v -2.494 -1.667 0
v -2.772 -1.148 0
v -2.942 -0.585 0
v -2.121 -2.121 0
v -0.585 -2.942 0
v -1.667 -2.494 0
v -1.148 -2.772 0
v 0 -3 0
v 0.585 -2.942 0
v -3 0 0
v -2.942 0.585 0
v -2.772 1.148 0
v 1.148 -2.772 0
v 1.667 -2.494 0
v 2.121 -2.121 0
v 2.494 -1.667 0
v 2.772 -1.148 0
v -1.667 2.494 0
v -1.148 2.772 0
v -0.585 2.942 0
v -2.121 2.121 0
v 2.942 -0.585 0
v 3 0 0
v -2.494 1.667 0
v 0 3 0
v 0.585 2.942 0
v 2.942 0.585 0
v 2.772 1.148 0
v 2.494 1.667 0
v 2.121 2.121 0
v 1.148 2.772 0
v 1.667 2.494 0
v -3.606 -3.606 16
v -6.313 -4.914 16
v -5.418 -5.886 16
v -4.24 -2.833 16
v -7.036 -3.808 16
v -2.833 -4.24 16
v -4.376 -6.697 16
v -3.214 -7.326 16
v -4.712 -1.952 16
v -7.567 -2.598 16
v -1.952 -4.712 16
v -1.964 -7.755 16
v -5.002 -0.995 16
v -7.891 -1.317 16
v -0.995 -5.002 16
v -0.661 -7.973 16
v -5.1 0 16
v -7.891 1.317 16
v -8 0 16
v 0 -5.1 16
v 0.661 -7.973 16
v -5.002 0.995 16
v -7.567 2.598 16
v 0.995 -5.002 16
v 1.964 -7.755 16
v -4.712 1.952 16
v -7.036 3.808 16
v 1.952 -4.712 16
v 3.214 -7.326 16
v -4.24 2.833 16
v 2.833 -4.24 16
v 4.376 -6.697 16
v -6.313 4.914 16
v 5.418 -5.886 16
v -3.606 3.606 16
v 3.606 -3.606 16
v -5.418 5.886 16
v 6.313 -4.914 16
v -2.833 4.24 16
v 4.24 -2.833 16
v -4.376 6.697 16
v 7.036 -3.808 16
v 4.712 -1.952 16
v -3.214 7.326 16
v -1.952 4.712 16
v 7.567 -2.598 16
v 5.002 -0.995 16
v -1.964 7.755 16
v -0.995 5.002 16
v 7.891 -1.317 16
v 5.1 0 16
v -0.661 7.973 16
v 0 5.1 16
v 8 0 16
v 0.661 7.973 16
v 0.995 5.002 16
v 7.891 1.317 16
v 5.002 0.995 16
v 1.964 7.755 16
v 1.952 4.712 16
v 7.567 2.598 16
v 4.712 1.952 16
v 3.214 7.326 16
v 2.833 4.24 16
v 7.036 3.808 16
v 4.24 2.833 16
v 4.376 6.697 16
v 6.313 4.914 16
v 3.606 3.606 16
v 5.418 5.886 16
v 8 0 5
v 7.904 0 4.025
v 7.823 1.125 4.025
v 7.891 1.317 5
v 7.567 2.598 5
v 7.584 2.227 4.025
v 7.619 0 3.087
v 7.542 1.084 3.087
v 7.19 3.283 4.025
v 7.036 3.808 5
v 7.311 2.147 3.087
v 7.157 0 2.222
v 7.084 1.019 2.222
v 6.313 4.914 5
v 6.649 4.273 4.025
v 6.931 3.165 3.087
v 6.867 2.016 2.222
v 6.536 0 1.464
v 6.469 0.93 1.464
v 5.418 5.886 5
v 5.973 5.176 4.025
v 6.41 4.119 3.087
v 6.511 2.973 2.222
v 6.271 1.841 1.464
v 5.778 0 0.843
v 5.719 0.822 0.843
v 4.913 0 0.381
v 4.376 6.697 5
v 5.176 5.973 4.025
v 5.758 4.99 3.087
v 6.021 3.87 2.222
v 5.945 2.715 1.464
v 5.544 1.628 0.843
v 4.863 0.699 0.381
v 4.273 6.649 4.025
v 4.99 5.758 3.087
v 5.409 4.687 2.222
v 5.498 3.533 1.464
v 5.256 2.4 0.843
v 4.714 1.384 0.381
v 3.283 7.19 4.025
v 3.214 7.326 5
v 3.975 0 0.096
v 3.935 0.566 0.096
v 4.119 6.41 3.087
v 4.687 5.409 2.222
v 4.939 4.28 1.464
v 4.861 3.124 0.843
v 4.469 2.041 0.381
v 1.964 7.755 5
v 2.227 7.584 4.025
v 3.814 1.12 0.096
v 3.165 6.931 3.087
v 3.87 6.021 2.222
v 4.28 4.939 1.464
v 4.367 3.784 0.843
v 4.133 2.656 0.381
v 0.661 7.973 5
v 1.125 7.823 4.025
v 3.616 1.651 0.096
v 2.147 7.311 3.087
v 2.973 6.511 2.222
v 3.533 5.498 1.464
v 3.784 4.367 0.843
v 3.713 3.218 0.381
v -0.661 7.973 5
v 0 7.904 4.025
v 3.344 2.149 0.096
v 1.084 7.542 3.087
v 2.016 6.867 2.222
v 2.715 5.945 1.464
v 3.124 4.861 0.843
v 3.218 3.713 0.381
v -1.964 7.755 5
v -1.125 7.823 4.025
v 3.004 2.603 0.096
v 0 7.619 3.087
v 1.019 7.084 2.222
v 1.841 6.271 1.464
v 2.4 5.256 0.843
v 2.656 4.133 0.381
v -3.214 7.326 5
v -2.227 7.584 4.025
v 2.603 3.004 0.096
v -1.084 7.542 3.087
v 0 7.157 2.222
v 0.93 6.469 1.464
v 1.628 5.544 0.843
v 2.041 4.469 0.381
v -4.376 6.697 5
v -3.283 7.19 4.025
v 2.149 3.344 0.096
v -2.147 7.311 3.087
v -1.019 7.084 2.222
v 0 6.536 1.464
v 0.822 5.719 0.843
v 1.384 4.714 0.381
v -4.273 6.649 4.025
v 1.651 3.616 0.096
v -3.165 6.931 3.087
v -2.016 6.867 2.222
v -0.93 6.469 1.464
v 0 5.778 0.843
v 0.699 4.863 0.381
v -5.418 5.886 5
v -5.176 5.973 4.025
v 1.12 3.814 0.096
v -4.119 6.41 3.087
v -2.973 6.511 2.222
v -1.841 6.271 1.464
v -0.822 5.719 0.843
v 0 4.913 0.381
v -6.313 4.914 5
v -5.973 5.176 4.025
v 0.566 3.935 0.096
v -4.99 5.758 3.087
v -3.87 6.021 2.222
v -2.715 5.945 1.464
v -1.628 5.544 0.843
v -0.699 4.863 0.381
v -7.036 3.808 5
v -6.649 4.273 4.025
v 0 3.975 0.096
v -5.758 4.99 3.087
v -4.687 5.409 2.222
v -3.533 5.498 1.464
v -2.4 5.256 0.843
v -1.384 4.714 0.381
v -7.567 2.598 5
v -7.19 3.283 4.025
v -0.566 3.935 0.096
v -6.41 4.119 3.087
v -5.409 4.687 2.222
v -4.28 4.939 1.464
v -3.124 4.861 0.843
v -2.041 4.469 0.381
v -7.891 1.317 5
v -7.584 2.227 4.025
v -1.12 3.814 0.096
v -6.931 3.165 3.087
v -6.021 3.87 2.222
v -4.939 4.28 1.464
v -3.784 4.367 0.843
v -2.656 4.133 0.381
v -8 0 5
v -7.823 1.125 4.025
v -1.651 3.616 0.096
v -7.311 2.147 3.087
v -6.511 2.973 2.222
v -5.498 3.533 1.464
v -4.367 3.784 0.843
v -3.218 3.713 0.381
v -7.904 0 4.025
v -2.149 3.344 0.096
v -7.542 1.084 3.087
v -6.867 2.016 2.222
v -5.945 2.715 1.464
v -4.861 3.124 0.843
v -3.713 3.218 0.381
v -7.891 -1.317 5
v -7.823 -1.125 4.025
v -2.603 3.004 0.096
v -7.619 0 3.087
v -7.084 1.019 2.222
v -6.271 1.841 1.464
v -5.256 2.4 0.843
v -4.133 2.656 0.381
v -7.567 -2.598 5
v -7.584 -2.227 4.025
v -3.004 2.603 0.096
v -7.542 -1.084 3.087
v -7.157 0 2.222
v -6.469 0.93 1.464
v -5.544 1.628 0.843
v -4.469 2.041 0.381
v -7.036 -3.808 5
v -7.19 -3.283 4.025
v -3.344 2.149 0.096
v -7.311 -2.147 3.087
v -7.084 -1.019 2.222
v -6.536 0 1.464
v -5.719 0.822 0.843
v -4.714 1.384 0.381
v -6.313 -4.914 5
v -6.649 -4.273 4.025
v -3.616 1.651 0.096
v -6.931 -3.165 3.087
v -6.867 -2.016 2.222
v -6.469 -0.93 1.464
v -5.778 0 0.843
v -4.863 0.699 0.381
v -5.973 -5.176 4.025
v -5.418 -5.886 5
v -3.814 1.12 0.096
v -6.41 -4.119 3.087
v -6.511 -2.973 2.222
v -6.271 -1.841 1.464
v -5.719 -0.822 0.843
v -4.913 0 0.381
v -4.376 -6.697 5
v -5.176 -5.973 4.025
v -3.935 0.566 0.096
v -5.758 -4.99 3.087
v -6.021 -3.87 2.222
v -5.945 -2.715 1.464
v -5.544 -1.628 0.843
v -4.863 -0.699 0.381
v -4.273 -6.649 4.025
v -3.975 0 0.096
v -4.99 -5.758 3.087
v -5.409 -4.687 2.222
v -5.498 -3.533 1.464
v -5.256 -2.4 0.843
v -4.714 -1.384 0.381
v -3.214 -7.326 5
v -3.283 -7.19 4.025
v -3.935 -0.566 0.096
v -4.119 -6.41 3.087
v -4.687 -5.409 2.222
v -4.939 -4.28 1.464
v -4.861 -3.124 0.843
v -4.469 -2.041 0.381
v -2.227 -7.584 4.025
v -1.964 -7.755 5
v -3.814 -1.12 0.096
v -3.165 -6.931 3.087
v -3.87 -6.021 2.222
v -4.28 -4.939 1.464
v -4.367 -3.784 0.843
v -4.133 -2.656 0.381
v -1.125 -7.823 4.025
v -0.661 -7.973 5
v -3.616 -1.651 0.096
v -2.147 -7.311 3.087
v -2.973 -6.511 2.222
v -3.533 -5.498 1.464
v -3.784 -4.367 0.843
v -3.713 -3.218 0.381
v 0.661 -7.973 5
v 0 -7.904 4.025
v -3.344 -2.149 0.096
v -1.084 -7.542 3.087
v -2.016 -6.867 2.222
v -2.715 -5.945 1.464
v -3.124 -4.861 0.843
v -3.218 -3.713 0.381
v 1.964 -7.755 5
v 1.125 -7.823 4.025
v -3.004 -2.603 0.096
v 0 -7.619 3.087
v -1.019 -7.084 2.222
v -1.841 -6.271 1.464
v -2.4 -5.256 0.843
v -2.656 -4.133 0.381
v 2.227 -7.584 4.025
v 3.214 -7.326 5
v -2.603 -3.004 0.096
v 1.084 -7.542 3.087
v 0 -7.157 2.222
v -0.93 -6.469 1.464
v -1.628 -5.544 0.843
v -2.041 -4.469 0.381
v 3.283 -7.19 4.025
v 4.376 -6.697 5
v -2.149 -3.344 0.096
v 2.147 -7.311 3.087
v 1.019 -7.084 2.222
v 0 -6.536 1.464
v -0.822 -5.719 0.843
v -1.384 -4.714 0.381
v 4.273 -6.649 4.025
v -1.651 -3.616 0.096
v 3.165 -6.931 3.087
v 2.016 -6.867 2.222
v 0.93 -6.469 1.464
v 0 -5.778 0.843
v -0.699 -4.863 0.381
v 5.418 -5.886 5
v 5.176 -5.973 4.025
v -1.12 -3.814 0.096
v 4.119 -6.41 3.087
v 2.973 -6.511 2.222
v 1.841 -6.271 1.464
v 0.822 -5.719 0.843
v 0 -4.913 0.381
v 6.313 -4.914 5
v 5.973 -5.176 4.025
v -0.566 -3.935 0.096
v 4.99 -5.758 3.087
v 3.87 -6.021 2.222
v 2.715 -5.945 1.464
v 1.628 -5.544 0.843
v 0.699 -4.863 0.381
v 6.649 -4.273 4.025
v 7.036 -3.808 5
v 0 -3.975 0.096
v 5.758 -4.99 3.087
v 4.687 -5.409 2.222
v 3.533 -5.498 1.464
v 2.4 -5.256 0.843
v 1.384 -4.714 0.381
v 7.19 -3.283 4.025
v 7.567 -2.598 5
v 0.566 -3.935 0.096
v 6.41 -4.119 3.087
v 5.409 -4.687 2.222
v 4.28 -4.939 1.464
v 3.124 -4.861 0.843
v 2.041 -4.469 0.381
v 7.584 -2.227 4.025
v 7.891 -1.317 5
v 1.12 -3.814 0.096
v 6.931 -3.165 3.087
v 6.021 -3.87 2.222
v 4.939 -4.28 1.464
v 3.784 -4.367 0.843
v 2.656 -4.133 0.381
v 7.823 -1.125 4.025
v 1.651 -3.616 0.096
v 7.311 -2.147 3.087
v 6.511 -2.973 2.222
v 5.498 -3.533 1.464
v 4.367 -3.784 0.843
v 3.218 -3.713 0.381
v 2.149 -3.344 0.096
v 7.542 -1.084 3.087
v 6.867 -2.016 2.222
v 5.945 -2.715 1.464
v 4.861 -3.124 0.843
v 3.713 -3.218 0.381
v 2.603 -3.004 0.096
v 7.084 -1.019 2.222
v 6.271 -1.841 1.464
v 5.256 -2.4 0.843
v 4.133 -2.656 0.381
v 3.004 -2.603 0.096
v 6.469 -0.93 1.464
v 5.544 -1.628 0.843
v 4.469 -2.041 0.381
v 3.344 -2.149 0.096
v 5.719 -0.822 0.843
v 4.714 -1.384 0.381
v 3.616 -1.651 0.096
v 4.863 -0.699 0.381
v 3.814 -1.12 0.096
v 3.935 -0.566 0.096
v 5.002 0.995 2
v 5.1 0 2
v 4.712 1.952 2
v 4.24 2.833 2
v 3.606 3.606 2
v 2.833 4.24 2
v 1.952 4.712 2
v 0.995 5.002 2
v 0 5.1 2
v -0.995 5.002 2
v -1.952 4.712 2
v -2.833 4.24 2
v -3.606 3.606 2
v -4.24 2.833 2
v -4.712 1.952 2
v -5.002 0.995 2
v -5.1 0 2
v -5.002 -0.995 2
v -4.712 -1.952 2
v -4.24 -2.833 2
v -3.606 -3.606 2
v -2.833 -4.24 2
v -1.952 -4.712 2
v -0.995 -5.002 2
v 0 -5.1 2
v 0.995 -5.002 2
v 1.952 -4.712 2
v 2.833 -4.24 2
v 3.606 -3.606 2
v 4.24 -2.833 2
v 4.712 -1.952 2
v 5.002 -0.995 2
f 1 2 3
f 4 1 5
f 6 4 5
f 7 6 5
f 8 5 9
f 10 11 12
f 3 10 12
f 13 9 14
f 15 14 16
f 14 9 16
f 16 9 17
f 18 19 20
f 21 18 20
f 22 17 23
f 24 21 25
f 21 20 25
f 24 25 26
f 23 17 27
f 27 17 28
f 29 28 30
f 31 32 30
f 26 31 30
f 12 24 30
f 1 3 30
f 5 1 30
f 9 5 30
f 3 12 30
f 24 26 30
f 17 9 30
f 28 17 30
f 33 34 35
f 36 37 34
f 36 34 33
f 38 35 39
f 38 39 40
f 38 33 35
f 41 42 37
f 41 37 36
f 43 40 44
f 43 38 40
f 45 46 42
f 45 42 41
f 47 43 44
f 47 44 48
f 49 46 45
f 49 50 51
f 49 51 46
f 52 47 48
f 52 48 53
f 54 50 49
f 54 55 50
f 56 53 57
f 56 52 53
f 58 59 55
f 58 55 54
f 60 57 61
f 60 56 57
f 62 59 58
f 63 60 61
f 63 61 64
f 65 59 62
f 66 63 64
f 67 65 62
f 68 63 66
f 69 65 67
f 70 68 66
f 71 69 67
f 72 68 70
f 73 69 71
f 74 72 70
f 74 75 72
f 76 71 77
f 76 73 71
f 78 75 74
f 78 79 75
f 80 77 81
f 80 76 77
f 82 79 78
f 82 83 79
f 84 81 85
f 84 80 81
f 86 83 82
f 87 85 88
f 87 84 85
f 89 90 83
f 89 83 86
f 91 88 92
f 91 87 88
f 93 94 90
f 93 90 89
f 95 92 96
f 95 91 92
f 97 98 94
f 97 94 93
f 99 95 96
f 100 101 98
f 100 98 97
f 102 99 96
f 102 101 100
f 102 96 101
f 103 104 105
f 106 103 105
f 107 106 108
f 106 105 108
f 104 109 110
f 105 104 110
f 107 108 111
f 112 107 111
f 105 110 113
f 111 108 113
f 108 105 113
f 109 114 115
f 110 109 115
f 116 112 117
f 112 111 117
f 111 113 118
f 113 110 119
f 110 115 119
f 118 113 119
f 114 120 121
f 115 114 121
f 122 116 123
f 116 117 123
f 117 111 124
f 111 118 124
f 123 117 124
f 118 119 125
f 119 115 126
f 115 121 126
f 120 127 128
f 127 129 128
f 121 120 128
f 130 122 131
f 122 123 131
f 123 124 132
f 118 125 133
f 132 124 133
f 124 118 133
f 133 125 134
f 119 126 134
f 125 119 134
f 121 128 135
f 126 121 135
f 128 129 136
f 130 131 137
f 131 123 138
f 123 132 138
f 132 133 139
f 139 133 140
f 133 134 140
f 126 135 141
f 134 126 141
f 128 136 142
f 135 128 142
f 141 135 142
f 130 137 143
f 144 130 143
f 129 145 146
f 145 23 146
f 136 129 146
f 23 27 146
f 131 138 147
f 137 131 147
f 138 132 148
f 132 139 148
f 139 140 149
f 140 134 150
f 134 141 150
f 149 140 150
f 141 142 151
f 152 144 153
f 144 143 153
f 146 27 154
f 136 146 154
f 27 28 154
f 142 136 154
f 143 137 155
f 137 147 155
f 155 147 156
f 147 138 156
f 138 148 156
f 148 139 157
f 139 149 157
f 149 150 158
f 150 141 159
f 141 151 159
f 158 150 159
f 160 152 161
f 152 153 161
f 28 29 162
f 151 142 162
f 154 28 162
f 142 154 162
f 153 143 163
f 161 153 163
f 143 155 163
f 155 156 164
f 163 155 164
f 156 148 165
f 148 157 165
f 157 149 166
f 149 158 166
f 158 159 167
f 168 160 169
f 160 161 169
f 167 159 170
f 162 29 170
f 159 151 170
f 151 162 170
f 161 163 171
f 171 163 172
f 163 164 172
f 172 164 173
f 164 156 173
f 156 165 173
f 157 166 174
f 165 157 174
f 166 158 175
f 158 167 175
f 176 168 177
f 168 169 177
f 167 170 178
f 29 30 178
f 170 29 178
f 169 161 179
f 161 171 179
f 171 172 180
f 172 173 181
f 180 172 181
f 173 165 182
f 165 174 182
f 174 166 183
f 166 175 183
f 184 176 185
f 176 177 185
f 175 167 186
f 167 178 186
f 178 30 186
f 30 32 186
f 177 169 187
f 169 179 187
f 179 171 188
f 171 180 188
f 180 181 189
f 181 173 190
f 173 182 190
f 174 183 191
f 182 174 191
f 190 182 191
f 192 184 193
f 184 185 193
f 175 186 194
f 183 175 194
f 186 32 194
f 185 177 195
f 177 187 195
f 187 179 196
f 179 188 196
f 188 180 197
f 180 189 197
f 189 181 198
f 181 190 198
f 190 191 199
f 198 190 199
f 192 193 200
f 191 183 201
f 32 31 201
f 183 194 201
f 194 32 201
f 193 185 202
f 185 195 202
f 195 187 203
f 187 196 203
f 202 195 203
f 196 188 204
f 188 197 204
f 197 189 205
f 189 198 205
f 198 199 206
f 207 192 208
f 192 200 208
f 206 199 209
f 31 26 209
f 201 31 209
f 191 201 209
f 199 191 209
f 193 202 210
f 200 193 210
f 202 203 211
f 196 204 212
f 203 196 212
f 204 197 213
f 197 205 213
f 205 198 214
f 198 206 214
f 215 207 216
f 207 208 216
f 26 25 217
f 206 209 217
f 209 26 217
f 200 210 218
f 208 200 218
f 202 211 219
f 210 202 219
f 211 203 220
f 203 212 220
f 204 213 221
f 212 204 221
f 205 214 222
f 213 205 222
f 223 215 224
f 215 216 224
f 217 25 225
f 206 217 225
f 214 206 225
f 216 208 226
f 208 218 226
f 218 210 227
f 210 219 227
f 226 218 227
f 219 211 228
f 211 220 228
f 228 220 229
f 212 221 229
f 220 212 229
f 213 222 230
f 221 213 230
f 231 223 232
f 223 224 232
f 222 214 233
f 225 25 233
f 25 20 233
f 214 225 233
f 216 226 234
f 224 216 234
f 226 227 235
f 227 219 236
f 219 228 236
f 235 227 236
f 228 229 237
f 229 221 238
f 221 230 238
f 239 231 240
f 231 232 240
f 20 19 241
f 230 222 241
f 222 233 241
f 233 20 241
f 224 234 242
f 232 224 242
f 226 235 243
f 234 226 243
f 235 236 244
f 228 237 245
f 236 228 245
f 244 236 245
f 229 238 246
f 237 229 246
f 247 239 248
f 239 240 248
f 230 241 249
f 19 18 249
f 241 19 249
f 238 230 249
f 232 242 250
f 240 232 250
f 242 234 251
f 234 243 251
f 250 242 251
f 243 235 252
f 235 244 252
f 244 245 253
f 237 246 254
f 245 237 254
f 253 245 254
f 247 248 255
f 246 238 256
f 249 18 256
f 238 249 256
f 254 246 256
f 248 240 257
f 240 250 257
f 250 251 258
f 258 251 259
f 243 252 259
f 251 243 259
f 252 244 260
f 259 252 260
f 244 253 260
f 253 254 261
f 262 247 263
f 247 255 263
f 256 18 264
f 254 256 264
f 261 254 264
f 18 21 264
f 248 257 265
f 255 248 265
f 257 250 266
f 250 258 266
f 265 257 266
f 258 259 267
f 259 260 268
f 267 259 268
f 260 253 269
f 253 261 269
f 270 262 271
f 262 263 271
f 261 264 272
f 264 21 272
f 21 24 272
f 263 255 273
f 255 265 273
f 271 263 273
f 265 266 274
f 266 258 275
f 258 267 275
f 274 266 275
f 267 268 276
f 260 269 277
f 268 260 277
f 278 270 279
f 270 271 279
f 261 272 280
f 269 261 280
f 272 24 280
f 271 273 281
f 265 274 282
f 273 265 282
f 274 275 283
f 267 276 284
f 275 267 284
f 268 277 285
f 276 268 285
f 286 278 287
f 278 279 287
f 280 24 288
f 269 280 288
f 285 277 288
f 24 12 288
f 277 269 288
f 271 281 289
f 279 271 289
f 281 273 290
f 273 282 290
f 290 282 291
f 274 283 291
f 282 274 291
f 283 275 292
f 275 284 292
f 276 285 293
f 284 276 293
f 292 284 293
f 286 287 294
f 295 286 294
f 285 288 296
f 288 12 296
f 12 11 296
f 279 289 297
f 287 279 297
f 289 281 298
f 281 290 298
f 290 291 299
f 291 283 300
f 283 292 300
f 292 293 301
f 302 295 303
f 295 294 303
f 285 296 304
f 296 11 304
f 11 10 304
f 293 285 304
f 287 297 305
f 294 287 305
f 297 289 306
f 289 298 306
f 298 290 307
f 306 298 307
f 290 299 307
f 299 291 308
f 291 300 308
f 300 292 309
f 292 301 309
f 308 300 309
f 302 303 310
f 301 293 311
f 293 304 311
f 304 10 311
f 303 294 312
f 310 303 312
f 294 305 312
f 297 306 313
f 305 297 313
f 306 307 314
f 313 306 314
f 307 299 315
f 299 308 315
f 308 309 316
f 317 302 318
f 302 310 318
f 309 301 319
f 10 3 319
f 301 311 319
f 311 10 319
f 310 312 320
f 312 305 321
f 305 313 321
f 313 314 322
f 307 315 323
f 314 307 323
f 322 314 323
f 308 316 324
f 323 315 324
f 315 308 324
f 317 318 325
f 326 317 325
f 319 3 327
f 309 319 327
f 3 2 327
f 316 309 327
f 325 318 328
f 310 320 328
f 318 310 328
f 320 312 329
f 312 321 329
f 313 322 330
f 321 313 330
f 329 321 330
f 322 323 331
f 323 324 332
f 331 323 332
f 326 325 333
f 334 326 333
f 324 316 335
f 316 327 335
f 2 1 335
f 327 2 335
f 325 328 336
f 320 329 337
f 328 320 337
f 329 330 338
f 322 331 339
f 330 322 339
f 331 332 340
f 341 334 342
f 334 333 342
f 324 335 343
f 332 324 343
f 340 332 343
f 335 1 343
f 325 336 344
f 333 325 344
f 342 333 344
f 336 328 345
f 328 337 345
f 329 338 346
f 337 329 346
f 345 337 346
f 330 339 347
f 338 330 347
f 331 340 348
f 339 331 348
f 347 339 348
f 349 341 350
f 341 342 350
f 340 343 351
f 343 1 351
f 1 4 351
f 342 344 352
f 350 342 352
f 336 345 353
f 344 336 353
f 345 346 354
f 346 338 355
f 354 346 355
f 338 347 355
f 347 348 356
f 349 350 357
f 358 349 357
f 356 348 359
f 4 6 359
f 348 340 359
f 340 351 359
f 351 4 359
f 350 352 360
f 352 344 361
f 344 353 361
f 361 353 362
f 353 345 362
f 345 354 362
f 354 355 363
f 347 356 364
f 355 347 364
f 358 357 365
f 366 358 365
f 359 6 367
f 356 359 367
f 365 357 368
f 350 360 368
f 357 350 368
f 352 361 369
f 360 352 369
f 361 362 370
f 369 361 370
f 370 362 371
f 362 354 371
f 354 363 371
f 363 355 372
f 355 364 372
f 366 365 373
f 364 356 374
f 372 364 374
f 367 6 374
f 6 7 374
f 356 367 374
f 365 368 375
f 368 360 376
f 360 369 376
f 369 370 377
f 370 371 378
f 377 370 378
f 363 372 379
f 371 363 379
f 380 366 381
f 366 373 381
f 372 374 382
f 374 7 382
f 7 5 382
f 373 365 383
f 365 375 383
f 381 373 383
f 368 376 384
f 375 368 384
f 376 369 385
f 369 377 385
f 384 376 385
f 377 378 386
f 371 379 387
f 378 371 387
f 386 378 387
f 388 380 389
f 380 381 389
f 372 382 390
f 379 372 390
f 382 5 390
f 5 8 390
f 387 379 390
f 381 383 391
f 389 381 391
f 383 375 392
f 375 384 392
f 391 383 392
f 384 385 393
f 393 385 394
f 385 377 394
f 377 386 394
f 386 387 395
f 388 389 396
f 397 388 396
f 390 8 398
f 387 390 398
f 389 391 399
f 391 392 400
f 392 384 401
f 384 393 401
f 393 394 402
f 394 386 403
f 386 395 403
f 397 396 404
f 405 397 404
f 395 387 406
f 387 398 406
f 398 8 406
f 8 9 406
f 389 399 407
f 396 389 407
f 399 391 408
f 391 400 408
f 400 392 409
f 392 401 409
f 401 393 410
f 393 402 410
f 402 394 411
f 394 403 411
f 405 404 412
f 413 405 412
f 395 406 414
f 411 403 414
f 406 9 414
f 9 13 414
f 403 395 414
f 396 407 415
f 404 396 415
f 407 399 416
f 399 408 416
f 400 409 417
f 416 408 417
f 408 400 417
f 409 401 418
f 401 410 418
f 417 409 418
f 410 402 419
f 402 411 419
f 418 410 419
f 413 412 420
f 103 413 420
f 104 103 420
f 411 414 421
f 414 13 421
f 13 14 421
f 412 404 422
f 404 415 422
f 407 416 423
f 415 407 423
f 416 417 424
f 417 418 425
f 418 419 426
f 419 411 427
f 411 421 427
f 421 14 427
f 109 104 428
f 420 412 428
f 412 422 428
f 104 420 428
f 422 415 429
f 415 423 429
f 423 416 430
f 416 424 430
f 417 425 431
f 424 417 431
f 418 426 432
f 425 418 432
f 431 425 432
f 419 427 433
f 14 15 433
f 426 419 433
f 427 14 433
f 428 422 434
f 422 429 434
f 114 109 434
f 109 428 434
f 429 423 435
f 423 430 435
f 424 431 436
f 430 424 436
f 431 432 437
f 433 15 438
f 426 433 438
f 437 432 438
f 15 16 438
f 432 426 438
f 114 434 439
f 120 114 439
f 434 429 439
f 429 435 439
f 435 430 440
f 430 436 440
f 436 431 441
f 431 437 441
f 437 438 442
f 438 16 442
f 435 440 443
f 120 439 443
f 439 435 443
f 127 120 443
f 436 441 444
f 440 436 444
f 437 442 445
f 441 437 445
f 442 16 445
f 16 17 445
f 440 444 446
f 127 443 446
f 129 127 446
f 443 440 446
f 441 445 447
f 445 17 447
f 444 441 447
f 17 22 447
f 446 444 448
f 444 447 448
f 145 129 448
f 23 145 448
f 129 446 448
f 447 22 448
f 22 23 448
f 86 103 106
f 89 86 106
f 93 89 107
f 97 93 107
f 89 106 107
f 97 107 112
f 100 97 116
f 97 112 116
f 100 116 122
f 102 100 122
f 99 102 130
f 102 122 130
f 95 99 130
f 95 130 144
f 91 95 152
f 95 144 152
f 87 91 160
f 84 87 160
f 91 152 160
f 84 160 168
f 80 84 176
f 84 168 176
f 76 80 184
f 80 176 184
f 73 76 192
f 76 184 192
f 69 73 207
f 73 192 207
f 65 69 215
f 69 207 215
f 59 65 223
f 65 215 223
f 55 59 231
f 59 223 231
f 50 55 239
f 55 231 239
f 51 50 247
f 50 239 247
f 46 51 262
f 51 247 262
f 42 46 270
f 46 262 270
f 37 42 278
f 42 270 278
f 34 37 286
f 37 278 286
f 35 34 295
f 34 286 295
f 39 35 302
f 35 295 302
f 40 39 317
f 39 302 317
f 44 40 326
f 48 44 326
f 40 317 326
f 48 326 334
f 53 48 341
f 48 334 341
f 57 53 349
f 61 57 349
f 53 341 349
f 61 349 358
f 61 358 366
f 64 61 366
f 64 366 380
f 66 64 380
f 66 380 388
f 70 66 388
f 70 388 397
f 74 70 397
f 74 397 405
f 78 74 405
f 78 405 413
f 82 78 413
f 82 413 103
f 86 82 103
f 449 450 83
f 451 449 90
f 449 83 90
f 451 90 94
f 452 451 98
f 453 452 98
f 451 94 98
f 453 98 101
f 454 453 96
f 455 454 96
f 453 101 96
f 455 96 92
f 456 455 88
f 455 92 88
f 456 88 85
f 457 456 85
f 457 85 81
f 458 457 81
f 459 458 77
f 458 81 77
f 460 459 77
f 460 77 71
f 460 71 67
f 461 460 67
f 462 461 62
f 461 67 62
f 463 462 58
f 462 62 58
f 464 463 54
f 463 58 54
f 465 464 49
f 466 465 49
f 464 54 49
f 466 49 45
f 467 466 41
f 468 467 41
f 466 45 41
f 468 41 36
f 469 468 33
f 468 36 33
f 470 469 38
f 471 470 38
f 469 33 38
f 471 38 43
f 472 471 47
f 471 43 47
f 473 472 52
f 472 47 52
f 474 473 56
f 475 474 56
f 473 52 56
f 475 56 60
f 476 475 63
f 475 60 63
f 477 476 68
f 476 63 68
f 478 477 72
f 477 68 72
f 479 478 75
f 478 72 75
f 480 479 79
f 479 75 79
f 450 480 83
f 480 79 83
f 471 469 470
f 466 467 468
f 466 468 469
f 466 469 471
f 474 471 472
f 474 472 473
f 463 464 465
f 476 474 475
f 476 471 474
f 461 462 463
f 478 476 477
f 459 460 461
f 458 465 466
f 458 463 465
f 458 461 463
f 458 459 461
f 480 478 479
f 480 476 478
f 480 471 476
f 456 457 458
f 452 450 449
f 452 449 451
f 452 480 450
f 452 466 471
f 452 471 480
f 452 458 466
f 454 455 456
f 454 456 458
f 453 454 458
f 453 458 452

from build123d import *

# Parameters (mm, degrees)
F0_R     = 8
F1_DEPTH = 16
F2_R     = 5.1
F3_DEPTH = 14
F4_R     = 5


with BuildPart() as f1:
    # F0 (on Top) → F1 (new body)
    with BuildSketch(Plane.XY):
        Circle(F0_R)
    extrude(amount=F1_DEPTH)

    # F2 (on face) → F3 (cut)
    with BuildSketch(Plane.XY.offset(16)):
        Circle(F2_R)
    extrude(amount=-F3_DEPTH, mode=Mode.SUBTRACT)

    # F4
    f4_edges = [f1.edges().sort_by_distance(p)[0] for p in [
        (-8, 0, 0),
    ]]
    fillet(f4_edges, radius=F4_R)


solid = f1.part
